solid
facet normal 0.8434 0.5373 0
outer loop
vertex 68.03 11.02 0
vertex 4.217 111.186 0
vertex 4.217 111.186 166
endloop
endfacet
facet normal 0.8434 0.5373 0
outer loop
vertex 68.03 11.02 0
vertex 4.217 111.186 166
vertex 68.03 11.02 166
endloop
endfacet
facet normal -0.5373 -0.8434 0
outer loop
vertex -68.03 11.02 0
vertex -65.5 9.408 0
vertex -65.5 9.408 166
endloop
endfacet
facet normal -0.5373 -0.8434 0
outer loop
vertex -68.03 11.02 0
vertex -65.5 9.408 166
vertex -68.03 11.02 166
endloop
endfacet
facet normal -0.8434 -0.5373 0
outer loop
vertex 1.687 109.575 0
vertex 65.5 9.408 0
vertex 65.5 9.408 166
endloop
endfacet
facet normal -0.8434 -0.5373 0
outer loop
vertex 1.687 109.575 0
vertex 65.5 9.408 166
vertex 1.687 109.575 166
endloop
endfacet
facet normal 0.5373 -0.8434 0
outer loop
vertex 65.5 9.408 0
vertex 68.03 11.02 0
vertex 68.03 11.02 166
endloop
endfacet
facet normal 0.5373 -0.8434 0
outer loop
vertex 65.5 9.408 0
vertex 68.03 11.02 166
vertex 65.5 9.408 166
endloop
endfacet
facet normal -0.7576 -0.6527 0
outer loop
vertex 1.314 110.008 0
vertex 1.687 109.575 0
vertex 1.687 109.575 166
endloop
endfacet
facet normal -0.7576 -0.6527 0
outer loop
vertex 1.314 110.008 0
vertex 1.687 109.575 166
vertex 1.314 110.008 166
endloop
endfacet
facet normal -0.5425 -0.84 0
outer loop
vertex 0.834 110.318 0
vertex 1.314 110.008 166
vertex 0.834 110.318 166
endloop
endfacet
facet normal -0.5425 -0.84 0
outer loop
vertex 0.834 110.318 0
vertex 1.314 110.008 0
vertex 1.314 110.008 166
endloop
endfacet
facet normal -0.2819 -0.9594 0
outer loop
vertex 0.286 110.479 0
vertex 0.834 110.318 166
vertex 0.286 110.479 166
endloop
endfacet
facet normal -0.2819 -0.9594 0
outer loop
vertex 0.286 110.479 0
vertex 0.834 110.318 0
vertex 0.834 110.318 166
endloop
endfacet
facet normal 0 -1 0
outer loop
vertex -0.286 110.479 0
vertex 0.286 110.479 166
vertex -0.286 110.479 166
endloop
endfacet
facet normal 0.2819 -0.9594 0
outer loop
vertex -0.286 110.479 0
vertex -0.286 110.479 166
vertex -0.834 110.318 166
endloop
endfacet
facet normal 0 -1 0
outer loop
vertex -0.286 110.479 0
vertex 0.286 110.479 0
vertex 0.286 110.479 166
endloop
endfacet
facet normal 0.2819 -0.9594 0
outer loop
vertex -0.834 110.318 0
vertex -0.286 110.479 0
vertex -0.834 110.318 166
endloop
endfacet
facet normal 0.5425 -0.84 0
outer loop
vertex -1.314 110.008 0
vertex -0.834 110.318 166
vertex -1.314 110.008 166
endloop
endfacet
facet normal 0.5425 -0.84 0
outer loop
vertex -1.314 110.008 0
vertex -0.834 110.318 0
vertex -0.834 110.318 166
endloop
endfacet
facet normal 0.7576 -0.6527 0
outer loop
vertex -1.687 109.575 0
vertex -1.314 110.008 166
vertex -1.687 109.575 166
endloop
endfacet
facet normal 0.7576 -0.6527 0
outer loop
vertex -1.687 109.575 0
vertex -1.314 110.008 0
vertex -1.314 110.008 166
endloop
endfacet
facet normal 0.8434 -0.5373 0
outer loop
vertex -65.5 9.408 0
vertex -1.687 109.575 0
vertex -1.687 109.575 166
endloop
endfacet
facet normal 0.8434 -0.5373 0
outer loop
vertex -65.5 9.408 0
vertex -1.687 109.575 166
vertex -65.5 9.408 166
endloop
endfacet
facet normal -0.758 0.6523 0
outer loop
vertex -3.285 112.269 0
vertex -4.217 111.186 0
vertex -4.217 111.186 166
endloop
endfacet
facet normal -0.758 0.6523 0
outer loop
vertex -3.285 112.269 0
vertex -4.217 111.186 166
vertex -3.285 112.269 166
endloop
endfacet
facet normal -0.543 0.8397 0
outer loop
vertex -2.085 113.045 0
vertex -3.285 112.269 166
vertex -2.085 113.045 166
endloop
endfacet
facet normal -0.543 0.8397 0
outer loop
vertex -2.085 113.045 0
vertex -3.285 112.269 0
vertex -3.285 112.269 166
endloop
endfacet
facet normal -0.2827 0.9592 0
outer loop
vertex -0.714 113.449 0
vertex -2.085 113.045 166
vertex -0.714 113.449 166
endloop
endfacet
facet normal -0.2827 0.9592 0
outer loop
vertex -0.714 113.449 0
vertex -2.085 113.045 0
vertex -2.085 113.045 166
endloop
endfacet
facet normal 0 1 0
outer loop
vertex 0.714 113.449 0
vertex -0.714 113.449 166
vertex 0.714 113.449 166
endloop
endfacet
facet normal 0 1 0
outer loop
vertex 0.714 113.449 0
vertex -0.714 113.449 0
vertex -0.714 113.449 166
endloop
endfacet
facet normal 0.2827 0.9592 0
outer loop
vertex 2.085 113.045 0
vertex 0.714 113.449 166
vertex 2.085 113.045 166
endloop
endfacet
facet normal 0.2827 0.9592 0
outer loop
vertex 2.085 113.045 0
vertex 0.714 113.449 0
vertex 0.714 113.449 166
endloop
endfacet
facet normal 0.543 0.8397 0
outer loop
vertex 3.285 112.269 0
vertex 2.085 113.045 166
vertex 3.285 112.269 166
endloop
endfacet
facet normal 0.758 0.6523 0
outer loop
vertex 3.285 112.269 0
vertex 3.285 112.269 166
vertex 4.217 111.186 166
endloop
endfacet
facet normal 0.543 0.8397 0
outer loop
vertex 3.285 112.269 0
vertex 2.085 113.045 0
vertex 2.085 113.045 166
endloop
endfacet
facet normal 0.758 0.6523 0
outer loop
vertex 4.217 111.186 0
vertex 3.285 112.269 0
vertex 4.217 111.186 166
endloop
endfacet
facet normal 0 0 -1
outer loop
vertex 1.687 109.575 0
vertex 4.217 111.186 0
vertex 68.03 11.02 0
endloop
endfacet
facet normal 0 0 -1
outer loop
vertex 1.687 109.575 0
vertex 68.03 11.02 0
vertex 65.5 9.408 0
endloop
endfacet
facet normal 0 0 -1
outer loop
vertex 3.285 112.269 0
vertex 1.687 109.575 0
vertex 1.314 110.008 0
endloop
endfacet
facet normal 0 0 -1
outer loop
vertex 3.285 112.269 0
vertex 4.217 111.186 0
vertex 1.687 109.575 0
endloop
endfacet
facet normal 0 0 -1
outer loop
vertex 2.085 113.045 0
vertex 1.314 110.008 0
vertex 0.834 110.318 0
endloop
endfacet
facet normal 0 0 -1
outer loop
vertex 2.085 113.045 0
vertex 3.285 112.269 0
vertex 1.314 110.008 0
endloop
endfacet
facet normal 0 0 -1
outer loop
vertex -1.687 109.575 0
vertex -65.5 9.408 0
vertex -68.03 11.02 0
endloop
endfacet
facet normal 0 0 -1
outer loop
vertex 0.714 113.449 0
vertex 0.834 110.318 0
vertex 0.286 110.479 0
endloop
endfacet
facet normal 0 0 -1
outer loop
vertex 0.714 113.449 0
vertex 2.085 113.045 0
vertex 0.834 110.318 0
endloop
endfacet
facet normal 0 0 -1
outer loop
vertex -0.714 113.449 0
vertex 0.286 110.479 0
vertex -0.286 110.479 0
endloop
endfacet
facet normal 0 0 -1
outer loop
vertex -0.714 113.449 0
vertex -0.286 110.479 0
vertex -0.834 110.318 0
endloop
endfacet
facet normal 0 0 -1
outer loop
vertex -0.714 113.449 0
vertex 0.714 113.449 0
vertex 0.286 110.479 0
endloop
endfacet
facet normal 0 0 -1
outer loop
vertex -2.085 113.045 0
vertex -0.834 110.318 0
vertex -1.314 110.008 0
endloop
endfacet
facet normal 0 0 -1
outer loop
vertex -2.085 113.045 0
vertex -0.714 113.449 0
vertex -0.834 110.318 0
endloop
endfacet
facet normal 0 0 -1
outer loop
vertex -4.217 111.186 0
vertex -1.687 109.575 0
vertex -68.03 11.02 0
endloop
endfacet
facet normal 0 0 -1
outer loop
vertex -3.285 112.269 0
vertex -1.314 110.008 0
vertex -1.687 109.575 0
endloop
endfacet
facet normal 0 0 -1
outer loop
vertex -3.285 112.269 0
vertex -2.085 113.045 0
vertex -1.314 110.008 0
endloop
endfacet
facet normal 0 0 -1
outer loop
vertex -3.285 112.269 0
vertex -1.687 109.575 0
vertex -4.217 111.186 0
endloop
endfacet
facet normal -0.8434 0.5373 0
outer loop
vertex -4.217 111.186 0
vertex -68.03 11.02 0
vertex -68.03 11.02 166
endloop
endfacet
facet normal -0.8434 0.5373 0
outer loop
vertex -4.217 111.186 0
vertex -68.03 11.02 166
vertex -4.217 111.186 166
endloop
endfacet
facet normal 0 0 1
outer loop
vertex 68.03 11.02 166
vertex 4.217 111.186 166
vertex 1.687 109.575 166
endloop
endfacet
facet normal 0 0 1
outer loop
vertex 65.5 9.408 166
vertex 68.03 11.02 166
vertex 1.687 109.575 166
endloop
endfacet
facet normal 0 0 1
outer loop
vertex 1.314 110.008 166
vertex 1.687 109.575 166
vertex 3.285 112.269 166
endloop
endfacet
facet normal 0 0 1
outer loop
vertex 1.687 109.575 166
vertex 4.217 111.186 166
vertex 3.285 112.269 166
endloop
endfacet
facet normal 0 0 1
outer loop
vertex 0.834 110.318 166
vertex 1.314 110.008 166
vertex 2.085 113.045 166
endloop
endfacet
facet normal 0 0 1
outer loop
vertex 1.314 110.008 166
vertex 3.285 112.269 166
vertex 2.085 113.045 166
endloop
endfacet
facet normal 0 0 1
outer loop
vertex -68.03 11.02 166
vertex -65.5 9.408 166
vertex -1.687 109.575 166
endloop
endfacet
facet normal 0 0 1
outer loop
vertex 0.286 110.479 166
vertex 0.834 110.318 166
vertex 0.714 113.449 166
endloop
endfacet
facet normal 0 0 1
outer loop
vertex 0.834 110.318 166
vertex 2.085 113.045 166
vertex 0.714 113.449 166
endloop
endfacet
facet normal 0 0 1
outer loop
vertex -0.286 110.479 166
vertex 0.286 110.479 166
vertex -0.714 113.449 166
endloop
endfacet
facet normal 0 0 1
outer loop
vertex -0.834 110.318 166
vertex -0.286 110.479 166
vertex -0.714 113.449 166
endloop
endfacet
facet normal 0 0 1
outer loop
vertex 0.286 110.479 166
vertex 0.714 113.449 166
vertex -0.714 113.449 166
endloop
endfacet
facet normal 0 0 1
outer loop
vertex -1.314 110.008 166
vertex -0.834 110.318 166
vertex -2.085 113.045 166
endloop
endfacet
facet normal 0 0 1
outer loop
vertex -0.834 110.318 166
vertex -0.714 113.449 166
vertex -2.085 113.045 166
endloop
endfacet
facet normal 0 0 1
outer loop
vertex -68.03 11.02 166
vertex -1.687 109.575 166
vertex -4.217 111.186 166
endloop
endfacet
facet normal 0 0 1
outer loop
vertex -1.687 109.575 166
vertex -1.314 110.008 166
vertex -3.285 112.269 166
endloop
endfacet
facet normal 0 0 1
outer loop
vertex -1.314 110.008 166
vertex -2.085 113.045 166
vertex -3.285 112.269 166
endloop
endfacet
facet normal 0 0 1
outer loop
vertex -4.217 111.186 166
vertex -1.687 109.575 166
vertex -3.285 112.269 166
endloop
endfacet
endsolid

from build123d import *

# Parameters (mm, degrees)
BOSS_EXTRUDE1_DEPTH = 166


with BuildPart() as part:
    # Sketch1 → Boss-Extrude1 (new body)
    with BuildSketch(Plane.XY):
        with BuildLine():
            ThreePointArc((-4.216957229, 111.186498042), (0, 113.5), (4.216957229, 111.186498042))
            Line((4.216957229, 111.186498042), (68.030174337, 11.019811517))
            Line((68.030174337, 11.019811517), (65.5, 9.407912692))
            Line((65.5, 9.407912692), (1.686782892, 109.574599217))
            ThreePointArc((1.686782892, 109.574599217), (0, 110.5), (-1.686782892, 109.574599217))
            Line((-1.686782892, 109.574599217), (-65.5, 9.407912692))
            Line((-65.5, 9.407912692), (-68.030174337, 11.019811517))
            Line((-68.030174337, 11.019811517), (-4.216957229, 111.186498042))
        make_face()
    extrude(amount=BOSS_EXTRUDE1_DEPTH)


solid = part.part
